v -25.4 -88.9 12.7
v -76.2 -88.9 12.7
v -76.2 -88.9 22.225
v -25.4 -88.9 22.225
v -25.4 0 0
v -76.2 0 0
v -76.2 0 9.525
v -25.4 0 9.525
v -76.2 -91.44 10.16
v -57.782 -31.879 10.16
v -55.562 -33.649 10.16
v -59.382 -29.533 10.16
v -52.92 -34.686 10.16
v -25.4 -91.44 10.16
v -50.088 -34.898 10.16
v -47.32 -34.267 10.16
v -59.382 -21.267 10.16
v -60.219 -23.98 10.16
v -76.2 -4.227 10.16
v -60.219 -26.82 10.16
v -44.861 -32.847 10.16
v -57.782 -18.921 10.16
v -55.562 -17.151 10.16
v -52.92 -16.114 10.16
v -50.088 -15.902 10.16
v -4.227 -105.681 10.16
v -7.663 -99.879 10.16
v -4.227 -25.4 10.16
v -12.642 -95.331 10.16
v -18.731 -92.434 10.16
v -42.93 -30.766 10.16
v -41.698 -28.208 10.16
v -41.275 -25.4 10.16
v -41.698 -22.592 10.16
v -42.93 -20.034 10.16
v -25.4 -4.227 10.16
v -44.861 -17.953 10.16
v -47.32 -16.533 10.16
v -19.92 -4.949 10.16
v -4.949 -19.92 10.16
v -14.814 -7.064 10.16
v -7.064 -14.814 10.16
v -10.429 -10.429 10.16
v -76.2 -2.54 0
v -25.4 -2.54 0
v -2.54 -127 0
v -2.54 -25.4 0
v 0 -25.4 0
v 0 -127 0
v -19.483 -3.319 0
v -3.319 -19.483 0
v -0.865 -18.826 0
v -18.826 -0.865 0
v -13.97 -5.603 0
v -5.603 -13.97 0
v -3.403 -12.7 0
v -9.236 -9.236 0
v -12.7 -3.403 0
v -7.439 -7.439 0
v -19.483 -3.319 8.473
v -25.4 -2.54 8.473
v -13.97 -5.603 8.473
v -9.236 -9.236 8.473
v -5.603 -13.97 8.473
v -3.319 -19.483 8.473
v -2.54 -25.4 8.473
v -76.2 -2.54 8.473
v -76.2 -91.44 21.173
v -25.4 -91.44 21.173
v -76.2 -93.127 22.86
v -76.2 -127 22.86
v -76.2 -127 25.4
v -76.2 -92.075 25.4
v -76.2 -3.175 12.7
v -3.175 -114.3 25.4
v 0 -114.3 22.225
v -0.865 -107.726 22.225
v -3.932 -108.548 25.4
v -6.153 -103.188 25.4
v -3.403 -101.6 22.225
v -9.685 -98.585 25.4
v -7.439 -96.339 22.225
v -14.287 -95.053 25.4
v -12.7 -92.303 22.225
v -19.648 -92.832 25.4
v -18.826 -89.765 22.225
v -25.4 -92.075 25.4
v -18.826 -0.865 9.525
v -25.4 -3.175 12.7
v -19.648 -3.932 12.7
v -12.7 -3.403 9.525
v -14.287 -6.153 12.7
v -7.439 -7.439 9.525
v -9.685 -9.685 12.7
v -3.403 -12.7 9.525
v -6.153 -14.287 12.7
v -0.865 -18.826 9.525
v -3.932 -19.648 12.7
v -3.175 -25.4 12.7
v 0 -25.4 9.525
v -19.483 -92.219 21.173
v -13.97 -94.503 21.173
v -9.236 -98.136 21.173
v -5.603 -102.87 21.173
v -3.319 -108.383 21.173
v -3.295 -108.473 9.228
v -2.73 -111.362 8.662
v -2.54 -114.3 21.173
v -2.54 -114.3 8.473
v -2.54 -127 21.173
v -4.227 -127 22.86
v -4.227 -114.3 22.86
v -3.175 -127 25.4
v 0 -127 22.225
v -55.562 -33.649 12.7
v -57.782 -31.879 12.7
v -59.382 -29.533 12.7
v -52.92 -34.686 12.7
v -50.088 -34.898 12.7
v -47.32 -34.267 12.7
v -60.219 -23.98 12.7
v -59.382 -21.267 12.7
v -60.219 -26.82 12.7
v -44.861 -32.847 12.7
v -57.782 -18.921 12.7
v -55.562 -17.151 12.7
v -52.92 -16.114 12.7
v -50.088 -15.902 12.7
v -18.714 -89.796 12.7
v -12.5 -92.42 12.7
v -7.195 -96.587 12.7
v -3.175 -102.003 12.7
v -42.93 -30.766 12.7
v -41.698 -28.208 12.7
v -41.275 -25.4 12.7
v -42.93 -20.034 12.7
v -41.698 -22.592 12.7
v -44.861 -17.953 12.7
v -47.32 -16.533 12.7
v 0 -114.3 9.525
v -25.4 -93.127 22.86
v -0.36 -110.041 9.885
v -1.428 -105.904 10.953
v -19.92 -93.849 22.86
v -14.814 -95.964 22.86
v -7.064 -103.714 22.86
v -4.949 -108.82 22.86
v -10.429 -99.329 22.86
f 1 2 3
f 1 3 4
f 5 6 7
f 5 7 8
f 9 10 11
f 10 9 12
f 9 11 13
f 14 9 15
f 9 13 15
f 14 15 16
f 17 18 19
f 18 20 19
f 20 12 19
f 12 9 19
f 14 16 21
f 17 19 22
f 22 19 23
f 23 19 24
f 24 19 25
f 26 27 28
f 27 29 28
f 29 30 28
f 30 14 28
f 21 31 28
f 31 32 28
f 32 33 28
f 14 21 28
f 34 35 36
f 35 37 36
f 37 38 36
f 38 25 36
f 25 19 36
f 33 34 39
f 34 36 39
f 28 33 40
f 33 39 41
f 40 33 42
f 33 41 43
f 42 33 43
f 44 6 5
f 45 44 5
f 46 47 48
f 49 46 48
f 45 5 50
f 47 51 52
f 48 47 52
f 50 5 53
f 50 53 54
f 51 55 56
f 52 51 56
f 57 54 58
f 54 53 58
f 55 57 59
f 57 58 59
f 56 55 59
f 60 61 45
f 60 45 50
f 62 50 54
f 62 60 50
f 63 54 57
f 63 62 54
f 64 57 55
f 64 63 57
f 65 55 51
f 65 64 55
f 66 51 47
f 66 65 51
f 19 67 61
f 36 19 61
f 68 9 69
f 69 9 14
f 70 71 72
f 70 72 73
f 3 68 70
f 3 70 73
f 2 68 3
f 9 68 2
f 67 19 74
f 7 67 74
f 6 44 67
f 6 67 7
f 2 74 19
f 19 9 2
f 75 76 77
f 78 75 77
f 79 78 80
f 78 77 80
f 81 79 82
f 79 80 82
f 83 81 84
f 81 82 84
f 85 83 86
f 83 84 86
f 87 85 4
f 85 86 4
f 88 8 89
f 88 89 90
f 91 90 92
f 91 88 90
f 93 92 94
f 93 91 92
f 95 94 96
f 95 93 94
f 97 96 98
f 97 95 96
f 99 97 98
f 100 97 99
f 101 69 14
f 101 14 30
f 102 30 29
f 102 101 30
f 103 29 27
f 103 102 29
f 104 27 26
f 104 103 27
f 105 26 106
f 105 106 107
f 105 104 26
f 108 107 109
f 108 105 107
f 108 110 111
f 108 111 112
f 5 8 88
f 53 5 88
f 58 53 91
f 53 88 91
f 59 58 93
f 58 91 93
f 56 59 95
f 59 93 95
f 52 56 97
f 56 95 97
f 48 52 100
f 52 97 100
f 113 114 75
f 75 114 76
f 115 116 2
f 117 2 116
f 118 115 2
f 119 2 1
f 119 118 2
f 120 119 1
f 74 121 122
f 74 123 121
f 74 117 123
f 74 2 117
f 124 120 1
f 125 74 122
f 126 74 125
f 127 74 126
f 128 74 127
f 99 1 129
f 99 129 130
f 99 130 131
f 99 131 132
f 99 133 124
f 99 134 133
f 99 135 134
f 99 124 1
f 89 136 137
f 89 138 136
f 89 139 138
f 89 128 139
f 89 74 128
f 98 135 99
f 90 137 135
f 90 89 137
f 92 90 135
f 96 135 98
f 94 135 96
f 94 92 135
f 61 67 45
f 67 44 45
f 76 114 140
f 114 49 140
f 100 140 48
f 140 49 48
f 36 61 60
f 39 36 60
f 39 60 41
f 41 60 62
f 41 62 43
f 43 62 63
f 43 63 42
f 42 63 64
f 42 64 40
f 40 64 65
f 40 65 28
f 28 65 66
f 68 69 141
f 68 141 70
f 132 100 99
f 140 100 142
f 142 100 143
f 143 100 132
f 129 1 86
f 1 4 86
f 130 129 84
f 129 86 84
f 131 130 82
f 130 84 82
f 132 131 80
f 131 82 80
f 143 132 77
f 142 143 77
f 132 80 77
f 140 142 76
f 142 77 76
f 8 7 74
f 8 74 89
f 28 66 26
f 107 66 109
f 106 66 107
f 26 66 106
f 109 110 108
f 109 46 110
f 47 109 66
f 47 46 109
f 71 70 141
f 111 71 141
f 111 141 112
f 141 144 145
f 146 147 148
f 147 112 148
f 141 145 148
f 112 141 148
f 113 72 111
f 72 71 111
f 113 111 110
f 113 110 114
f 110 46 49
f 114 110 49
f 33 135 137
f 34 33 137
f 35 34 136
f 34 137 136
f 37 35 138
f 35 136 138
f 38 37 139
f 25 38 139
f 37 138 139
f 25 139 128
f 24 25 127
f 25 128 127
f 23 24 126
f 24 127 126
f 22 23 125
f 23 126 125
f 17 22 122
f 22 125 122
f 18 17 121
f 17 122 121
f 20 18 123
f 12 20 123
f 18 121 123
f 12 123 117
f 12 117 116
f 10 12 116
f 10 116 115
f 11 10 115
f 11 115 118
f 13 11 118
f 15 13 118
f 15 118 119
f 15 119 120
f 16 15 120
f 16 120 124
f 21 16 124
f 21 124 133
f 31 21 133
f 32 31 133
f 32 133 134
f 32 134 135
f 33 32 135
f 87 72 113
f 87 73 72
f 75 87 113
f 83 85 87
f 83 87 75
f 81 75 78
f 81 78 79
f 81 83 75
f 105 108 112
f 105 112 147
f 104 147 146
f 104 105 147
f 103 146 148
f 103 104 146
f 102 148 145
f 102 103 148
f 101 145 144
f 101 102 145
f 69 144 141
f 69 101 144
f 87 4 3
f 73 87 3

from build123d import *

# Parameters (mm, degrees)
SKETCH1_W           = 76.2
SKETCH1_H           = 127
BOSS_EXTRUDE1_DEPTH = 12.7
SKETCH2_W           = 76.2
SKETCH2_H           = 38.1
BOSS_EXTRUDE2_DEPTH = 12.7
SKETCH3_R           = 9.525
CUT_EXTRUDE1_DEPTH  = 149.649688866
FILLET1_R           = 25.4
CHAMFER1_SIZE       = 3.175
SHELL1_T            = -2.54


with BuildPart() as part:
    # Sketch1 → Boss-Extrude1 (new body)
    with BuildSketch(Plane.XY):
        with Locations((-38.1, -63.5)):
            Rectangle(SKETCH1_W, SKETCH1_H)
    extrude(amount=BOSS_EXTRUDE1_DEPTH)

    # Sketch2 → Boss-Extrude2 (add)
    with BuildSketch(Plane.XY.offset(12.7)):
        with Locations((-38.1, -107.95)):
            Rectangle(SKETCH2_W, SKETCH2_H)
    extrude(amount=BOSS_EXTRUDE2_DEPTH)

    # Sketch3 → Cut-Extrude1 (cut, through all)
    with BuildSketch(Plane.XY.offset(12.7)):
        with Locations((-50.8, -25.4)):
            Circle(SKETCH3_R)
    extrude(amount=-CUT_EXTRUDE1_DEPTH, mode=Mode.SUBTRACT)

    # Fillet1
    fillet1_edges = [part.edges().sort_by_distance(p)[0] for p in [
        (0, -88.9, 19.05),
        (0, 0, 6.35),
    ]]
    fillet(fillet1_edges, radius=FILLET1_R)

    # Chamfer1
    chamfer1_edges = [part.edges().sort_by_distance(p)[0] for p in [
        (0, -69.85, 12.7),
        (0, -120.65, 25.4),
        (-50.8, -88.9, 25.4),
        (-7.439487758, -96.339487758, 25.4),
        (-50.8, 0, 12.7),
        (-7.439487758, -7.439487758, 12.7),
    ]]
    chamfer(chamfer1_edges, length=CHAMFER1_SIZE)

    # Shell1
    shell1_openings = [part.faces().sort_by_distance(p)[0] for p in [
        (-60.325, -25.4, 6.35),
        (-38.193985292, -65.538658625, 0),
        (-38.196714534, -127, 12.669604003),
        (-76.2, -73.894162641, 9.238687601),
    ]]
    offset(amount=SHELL1_T, openings=shell1_openings, kind=Kind.INTERSECTION)


solid = part.part
